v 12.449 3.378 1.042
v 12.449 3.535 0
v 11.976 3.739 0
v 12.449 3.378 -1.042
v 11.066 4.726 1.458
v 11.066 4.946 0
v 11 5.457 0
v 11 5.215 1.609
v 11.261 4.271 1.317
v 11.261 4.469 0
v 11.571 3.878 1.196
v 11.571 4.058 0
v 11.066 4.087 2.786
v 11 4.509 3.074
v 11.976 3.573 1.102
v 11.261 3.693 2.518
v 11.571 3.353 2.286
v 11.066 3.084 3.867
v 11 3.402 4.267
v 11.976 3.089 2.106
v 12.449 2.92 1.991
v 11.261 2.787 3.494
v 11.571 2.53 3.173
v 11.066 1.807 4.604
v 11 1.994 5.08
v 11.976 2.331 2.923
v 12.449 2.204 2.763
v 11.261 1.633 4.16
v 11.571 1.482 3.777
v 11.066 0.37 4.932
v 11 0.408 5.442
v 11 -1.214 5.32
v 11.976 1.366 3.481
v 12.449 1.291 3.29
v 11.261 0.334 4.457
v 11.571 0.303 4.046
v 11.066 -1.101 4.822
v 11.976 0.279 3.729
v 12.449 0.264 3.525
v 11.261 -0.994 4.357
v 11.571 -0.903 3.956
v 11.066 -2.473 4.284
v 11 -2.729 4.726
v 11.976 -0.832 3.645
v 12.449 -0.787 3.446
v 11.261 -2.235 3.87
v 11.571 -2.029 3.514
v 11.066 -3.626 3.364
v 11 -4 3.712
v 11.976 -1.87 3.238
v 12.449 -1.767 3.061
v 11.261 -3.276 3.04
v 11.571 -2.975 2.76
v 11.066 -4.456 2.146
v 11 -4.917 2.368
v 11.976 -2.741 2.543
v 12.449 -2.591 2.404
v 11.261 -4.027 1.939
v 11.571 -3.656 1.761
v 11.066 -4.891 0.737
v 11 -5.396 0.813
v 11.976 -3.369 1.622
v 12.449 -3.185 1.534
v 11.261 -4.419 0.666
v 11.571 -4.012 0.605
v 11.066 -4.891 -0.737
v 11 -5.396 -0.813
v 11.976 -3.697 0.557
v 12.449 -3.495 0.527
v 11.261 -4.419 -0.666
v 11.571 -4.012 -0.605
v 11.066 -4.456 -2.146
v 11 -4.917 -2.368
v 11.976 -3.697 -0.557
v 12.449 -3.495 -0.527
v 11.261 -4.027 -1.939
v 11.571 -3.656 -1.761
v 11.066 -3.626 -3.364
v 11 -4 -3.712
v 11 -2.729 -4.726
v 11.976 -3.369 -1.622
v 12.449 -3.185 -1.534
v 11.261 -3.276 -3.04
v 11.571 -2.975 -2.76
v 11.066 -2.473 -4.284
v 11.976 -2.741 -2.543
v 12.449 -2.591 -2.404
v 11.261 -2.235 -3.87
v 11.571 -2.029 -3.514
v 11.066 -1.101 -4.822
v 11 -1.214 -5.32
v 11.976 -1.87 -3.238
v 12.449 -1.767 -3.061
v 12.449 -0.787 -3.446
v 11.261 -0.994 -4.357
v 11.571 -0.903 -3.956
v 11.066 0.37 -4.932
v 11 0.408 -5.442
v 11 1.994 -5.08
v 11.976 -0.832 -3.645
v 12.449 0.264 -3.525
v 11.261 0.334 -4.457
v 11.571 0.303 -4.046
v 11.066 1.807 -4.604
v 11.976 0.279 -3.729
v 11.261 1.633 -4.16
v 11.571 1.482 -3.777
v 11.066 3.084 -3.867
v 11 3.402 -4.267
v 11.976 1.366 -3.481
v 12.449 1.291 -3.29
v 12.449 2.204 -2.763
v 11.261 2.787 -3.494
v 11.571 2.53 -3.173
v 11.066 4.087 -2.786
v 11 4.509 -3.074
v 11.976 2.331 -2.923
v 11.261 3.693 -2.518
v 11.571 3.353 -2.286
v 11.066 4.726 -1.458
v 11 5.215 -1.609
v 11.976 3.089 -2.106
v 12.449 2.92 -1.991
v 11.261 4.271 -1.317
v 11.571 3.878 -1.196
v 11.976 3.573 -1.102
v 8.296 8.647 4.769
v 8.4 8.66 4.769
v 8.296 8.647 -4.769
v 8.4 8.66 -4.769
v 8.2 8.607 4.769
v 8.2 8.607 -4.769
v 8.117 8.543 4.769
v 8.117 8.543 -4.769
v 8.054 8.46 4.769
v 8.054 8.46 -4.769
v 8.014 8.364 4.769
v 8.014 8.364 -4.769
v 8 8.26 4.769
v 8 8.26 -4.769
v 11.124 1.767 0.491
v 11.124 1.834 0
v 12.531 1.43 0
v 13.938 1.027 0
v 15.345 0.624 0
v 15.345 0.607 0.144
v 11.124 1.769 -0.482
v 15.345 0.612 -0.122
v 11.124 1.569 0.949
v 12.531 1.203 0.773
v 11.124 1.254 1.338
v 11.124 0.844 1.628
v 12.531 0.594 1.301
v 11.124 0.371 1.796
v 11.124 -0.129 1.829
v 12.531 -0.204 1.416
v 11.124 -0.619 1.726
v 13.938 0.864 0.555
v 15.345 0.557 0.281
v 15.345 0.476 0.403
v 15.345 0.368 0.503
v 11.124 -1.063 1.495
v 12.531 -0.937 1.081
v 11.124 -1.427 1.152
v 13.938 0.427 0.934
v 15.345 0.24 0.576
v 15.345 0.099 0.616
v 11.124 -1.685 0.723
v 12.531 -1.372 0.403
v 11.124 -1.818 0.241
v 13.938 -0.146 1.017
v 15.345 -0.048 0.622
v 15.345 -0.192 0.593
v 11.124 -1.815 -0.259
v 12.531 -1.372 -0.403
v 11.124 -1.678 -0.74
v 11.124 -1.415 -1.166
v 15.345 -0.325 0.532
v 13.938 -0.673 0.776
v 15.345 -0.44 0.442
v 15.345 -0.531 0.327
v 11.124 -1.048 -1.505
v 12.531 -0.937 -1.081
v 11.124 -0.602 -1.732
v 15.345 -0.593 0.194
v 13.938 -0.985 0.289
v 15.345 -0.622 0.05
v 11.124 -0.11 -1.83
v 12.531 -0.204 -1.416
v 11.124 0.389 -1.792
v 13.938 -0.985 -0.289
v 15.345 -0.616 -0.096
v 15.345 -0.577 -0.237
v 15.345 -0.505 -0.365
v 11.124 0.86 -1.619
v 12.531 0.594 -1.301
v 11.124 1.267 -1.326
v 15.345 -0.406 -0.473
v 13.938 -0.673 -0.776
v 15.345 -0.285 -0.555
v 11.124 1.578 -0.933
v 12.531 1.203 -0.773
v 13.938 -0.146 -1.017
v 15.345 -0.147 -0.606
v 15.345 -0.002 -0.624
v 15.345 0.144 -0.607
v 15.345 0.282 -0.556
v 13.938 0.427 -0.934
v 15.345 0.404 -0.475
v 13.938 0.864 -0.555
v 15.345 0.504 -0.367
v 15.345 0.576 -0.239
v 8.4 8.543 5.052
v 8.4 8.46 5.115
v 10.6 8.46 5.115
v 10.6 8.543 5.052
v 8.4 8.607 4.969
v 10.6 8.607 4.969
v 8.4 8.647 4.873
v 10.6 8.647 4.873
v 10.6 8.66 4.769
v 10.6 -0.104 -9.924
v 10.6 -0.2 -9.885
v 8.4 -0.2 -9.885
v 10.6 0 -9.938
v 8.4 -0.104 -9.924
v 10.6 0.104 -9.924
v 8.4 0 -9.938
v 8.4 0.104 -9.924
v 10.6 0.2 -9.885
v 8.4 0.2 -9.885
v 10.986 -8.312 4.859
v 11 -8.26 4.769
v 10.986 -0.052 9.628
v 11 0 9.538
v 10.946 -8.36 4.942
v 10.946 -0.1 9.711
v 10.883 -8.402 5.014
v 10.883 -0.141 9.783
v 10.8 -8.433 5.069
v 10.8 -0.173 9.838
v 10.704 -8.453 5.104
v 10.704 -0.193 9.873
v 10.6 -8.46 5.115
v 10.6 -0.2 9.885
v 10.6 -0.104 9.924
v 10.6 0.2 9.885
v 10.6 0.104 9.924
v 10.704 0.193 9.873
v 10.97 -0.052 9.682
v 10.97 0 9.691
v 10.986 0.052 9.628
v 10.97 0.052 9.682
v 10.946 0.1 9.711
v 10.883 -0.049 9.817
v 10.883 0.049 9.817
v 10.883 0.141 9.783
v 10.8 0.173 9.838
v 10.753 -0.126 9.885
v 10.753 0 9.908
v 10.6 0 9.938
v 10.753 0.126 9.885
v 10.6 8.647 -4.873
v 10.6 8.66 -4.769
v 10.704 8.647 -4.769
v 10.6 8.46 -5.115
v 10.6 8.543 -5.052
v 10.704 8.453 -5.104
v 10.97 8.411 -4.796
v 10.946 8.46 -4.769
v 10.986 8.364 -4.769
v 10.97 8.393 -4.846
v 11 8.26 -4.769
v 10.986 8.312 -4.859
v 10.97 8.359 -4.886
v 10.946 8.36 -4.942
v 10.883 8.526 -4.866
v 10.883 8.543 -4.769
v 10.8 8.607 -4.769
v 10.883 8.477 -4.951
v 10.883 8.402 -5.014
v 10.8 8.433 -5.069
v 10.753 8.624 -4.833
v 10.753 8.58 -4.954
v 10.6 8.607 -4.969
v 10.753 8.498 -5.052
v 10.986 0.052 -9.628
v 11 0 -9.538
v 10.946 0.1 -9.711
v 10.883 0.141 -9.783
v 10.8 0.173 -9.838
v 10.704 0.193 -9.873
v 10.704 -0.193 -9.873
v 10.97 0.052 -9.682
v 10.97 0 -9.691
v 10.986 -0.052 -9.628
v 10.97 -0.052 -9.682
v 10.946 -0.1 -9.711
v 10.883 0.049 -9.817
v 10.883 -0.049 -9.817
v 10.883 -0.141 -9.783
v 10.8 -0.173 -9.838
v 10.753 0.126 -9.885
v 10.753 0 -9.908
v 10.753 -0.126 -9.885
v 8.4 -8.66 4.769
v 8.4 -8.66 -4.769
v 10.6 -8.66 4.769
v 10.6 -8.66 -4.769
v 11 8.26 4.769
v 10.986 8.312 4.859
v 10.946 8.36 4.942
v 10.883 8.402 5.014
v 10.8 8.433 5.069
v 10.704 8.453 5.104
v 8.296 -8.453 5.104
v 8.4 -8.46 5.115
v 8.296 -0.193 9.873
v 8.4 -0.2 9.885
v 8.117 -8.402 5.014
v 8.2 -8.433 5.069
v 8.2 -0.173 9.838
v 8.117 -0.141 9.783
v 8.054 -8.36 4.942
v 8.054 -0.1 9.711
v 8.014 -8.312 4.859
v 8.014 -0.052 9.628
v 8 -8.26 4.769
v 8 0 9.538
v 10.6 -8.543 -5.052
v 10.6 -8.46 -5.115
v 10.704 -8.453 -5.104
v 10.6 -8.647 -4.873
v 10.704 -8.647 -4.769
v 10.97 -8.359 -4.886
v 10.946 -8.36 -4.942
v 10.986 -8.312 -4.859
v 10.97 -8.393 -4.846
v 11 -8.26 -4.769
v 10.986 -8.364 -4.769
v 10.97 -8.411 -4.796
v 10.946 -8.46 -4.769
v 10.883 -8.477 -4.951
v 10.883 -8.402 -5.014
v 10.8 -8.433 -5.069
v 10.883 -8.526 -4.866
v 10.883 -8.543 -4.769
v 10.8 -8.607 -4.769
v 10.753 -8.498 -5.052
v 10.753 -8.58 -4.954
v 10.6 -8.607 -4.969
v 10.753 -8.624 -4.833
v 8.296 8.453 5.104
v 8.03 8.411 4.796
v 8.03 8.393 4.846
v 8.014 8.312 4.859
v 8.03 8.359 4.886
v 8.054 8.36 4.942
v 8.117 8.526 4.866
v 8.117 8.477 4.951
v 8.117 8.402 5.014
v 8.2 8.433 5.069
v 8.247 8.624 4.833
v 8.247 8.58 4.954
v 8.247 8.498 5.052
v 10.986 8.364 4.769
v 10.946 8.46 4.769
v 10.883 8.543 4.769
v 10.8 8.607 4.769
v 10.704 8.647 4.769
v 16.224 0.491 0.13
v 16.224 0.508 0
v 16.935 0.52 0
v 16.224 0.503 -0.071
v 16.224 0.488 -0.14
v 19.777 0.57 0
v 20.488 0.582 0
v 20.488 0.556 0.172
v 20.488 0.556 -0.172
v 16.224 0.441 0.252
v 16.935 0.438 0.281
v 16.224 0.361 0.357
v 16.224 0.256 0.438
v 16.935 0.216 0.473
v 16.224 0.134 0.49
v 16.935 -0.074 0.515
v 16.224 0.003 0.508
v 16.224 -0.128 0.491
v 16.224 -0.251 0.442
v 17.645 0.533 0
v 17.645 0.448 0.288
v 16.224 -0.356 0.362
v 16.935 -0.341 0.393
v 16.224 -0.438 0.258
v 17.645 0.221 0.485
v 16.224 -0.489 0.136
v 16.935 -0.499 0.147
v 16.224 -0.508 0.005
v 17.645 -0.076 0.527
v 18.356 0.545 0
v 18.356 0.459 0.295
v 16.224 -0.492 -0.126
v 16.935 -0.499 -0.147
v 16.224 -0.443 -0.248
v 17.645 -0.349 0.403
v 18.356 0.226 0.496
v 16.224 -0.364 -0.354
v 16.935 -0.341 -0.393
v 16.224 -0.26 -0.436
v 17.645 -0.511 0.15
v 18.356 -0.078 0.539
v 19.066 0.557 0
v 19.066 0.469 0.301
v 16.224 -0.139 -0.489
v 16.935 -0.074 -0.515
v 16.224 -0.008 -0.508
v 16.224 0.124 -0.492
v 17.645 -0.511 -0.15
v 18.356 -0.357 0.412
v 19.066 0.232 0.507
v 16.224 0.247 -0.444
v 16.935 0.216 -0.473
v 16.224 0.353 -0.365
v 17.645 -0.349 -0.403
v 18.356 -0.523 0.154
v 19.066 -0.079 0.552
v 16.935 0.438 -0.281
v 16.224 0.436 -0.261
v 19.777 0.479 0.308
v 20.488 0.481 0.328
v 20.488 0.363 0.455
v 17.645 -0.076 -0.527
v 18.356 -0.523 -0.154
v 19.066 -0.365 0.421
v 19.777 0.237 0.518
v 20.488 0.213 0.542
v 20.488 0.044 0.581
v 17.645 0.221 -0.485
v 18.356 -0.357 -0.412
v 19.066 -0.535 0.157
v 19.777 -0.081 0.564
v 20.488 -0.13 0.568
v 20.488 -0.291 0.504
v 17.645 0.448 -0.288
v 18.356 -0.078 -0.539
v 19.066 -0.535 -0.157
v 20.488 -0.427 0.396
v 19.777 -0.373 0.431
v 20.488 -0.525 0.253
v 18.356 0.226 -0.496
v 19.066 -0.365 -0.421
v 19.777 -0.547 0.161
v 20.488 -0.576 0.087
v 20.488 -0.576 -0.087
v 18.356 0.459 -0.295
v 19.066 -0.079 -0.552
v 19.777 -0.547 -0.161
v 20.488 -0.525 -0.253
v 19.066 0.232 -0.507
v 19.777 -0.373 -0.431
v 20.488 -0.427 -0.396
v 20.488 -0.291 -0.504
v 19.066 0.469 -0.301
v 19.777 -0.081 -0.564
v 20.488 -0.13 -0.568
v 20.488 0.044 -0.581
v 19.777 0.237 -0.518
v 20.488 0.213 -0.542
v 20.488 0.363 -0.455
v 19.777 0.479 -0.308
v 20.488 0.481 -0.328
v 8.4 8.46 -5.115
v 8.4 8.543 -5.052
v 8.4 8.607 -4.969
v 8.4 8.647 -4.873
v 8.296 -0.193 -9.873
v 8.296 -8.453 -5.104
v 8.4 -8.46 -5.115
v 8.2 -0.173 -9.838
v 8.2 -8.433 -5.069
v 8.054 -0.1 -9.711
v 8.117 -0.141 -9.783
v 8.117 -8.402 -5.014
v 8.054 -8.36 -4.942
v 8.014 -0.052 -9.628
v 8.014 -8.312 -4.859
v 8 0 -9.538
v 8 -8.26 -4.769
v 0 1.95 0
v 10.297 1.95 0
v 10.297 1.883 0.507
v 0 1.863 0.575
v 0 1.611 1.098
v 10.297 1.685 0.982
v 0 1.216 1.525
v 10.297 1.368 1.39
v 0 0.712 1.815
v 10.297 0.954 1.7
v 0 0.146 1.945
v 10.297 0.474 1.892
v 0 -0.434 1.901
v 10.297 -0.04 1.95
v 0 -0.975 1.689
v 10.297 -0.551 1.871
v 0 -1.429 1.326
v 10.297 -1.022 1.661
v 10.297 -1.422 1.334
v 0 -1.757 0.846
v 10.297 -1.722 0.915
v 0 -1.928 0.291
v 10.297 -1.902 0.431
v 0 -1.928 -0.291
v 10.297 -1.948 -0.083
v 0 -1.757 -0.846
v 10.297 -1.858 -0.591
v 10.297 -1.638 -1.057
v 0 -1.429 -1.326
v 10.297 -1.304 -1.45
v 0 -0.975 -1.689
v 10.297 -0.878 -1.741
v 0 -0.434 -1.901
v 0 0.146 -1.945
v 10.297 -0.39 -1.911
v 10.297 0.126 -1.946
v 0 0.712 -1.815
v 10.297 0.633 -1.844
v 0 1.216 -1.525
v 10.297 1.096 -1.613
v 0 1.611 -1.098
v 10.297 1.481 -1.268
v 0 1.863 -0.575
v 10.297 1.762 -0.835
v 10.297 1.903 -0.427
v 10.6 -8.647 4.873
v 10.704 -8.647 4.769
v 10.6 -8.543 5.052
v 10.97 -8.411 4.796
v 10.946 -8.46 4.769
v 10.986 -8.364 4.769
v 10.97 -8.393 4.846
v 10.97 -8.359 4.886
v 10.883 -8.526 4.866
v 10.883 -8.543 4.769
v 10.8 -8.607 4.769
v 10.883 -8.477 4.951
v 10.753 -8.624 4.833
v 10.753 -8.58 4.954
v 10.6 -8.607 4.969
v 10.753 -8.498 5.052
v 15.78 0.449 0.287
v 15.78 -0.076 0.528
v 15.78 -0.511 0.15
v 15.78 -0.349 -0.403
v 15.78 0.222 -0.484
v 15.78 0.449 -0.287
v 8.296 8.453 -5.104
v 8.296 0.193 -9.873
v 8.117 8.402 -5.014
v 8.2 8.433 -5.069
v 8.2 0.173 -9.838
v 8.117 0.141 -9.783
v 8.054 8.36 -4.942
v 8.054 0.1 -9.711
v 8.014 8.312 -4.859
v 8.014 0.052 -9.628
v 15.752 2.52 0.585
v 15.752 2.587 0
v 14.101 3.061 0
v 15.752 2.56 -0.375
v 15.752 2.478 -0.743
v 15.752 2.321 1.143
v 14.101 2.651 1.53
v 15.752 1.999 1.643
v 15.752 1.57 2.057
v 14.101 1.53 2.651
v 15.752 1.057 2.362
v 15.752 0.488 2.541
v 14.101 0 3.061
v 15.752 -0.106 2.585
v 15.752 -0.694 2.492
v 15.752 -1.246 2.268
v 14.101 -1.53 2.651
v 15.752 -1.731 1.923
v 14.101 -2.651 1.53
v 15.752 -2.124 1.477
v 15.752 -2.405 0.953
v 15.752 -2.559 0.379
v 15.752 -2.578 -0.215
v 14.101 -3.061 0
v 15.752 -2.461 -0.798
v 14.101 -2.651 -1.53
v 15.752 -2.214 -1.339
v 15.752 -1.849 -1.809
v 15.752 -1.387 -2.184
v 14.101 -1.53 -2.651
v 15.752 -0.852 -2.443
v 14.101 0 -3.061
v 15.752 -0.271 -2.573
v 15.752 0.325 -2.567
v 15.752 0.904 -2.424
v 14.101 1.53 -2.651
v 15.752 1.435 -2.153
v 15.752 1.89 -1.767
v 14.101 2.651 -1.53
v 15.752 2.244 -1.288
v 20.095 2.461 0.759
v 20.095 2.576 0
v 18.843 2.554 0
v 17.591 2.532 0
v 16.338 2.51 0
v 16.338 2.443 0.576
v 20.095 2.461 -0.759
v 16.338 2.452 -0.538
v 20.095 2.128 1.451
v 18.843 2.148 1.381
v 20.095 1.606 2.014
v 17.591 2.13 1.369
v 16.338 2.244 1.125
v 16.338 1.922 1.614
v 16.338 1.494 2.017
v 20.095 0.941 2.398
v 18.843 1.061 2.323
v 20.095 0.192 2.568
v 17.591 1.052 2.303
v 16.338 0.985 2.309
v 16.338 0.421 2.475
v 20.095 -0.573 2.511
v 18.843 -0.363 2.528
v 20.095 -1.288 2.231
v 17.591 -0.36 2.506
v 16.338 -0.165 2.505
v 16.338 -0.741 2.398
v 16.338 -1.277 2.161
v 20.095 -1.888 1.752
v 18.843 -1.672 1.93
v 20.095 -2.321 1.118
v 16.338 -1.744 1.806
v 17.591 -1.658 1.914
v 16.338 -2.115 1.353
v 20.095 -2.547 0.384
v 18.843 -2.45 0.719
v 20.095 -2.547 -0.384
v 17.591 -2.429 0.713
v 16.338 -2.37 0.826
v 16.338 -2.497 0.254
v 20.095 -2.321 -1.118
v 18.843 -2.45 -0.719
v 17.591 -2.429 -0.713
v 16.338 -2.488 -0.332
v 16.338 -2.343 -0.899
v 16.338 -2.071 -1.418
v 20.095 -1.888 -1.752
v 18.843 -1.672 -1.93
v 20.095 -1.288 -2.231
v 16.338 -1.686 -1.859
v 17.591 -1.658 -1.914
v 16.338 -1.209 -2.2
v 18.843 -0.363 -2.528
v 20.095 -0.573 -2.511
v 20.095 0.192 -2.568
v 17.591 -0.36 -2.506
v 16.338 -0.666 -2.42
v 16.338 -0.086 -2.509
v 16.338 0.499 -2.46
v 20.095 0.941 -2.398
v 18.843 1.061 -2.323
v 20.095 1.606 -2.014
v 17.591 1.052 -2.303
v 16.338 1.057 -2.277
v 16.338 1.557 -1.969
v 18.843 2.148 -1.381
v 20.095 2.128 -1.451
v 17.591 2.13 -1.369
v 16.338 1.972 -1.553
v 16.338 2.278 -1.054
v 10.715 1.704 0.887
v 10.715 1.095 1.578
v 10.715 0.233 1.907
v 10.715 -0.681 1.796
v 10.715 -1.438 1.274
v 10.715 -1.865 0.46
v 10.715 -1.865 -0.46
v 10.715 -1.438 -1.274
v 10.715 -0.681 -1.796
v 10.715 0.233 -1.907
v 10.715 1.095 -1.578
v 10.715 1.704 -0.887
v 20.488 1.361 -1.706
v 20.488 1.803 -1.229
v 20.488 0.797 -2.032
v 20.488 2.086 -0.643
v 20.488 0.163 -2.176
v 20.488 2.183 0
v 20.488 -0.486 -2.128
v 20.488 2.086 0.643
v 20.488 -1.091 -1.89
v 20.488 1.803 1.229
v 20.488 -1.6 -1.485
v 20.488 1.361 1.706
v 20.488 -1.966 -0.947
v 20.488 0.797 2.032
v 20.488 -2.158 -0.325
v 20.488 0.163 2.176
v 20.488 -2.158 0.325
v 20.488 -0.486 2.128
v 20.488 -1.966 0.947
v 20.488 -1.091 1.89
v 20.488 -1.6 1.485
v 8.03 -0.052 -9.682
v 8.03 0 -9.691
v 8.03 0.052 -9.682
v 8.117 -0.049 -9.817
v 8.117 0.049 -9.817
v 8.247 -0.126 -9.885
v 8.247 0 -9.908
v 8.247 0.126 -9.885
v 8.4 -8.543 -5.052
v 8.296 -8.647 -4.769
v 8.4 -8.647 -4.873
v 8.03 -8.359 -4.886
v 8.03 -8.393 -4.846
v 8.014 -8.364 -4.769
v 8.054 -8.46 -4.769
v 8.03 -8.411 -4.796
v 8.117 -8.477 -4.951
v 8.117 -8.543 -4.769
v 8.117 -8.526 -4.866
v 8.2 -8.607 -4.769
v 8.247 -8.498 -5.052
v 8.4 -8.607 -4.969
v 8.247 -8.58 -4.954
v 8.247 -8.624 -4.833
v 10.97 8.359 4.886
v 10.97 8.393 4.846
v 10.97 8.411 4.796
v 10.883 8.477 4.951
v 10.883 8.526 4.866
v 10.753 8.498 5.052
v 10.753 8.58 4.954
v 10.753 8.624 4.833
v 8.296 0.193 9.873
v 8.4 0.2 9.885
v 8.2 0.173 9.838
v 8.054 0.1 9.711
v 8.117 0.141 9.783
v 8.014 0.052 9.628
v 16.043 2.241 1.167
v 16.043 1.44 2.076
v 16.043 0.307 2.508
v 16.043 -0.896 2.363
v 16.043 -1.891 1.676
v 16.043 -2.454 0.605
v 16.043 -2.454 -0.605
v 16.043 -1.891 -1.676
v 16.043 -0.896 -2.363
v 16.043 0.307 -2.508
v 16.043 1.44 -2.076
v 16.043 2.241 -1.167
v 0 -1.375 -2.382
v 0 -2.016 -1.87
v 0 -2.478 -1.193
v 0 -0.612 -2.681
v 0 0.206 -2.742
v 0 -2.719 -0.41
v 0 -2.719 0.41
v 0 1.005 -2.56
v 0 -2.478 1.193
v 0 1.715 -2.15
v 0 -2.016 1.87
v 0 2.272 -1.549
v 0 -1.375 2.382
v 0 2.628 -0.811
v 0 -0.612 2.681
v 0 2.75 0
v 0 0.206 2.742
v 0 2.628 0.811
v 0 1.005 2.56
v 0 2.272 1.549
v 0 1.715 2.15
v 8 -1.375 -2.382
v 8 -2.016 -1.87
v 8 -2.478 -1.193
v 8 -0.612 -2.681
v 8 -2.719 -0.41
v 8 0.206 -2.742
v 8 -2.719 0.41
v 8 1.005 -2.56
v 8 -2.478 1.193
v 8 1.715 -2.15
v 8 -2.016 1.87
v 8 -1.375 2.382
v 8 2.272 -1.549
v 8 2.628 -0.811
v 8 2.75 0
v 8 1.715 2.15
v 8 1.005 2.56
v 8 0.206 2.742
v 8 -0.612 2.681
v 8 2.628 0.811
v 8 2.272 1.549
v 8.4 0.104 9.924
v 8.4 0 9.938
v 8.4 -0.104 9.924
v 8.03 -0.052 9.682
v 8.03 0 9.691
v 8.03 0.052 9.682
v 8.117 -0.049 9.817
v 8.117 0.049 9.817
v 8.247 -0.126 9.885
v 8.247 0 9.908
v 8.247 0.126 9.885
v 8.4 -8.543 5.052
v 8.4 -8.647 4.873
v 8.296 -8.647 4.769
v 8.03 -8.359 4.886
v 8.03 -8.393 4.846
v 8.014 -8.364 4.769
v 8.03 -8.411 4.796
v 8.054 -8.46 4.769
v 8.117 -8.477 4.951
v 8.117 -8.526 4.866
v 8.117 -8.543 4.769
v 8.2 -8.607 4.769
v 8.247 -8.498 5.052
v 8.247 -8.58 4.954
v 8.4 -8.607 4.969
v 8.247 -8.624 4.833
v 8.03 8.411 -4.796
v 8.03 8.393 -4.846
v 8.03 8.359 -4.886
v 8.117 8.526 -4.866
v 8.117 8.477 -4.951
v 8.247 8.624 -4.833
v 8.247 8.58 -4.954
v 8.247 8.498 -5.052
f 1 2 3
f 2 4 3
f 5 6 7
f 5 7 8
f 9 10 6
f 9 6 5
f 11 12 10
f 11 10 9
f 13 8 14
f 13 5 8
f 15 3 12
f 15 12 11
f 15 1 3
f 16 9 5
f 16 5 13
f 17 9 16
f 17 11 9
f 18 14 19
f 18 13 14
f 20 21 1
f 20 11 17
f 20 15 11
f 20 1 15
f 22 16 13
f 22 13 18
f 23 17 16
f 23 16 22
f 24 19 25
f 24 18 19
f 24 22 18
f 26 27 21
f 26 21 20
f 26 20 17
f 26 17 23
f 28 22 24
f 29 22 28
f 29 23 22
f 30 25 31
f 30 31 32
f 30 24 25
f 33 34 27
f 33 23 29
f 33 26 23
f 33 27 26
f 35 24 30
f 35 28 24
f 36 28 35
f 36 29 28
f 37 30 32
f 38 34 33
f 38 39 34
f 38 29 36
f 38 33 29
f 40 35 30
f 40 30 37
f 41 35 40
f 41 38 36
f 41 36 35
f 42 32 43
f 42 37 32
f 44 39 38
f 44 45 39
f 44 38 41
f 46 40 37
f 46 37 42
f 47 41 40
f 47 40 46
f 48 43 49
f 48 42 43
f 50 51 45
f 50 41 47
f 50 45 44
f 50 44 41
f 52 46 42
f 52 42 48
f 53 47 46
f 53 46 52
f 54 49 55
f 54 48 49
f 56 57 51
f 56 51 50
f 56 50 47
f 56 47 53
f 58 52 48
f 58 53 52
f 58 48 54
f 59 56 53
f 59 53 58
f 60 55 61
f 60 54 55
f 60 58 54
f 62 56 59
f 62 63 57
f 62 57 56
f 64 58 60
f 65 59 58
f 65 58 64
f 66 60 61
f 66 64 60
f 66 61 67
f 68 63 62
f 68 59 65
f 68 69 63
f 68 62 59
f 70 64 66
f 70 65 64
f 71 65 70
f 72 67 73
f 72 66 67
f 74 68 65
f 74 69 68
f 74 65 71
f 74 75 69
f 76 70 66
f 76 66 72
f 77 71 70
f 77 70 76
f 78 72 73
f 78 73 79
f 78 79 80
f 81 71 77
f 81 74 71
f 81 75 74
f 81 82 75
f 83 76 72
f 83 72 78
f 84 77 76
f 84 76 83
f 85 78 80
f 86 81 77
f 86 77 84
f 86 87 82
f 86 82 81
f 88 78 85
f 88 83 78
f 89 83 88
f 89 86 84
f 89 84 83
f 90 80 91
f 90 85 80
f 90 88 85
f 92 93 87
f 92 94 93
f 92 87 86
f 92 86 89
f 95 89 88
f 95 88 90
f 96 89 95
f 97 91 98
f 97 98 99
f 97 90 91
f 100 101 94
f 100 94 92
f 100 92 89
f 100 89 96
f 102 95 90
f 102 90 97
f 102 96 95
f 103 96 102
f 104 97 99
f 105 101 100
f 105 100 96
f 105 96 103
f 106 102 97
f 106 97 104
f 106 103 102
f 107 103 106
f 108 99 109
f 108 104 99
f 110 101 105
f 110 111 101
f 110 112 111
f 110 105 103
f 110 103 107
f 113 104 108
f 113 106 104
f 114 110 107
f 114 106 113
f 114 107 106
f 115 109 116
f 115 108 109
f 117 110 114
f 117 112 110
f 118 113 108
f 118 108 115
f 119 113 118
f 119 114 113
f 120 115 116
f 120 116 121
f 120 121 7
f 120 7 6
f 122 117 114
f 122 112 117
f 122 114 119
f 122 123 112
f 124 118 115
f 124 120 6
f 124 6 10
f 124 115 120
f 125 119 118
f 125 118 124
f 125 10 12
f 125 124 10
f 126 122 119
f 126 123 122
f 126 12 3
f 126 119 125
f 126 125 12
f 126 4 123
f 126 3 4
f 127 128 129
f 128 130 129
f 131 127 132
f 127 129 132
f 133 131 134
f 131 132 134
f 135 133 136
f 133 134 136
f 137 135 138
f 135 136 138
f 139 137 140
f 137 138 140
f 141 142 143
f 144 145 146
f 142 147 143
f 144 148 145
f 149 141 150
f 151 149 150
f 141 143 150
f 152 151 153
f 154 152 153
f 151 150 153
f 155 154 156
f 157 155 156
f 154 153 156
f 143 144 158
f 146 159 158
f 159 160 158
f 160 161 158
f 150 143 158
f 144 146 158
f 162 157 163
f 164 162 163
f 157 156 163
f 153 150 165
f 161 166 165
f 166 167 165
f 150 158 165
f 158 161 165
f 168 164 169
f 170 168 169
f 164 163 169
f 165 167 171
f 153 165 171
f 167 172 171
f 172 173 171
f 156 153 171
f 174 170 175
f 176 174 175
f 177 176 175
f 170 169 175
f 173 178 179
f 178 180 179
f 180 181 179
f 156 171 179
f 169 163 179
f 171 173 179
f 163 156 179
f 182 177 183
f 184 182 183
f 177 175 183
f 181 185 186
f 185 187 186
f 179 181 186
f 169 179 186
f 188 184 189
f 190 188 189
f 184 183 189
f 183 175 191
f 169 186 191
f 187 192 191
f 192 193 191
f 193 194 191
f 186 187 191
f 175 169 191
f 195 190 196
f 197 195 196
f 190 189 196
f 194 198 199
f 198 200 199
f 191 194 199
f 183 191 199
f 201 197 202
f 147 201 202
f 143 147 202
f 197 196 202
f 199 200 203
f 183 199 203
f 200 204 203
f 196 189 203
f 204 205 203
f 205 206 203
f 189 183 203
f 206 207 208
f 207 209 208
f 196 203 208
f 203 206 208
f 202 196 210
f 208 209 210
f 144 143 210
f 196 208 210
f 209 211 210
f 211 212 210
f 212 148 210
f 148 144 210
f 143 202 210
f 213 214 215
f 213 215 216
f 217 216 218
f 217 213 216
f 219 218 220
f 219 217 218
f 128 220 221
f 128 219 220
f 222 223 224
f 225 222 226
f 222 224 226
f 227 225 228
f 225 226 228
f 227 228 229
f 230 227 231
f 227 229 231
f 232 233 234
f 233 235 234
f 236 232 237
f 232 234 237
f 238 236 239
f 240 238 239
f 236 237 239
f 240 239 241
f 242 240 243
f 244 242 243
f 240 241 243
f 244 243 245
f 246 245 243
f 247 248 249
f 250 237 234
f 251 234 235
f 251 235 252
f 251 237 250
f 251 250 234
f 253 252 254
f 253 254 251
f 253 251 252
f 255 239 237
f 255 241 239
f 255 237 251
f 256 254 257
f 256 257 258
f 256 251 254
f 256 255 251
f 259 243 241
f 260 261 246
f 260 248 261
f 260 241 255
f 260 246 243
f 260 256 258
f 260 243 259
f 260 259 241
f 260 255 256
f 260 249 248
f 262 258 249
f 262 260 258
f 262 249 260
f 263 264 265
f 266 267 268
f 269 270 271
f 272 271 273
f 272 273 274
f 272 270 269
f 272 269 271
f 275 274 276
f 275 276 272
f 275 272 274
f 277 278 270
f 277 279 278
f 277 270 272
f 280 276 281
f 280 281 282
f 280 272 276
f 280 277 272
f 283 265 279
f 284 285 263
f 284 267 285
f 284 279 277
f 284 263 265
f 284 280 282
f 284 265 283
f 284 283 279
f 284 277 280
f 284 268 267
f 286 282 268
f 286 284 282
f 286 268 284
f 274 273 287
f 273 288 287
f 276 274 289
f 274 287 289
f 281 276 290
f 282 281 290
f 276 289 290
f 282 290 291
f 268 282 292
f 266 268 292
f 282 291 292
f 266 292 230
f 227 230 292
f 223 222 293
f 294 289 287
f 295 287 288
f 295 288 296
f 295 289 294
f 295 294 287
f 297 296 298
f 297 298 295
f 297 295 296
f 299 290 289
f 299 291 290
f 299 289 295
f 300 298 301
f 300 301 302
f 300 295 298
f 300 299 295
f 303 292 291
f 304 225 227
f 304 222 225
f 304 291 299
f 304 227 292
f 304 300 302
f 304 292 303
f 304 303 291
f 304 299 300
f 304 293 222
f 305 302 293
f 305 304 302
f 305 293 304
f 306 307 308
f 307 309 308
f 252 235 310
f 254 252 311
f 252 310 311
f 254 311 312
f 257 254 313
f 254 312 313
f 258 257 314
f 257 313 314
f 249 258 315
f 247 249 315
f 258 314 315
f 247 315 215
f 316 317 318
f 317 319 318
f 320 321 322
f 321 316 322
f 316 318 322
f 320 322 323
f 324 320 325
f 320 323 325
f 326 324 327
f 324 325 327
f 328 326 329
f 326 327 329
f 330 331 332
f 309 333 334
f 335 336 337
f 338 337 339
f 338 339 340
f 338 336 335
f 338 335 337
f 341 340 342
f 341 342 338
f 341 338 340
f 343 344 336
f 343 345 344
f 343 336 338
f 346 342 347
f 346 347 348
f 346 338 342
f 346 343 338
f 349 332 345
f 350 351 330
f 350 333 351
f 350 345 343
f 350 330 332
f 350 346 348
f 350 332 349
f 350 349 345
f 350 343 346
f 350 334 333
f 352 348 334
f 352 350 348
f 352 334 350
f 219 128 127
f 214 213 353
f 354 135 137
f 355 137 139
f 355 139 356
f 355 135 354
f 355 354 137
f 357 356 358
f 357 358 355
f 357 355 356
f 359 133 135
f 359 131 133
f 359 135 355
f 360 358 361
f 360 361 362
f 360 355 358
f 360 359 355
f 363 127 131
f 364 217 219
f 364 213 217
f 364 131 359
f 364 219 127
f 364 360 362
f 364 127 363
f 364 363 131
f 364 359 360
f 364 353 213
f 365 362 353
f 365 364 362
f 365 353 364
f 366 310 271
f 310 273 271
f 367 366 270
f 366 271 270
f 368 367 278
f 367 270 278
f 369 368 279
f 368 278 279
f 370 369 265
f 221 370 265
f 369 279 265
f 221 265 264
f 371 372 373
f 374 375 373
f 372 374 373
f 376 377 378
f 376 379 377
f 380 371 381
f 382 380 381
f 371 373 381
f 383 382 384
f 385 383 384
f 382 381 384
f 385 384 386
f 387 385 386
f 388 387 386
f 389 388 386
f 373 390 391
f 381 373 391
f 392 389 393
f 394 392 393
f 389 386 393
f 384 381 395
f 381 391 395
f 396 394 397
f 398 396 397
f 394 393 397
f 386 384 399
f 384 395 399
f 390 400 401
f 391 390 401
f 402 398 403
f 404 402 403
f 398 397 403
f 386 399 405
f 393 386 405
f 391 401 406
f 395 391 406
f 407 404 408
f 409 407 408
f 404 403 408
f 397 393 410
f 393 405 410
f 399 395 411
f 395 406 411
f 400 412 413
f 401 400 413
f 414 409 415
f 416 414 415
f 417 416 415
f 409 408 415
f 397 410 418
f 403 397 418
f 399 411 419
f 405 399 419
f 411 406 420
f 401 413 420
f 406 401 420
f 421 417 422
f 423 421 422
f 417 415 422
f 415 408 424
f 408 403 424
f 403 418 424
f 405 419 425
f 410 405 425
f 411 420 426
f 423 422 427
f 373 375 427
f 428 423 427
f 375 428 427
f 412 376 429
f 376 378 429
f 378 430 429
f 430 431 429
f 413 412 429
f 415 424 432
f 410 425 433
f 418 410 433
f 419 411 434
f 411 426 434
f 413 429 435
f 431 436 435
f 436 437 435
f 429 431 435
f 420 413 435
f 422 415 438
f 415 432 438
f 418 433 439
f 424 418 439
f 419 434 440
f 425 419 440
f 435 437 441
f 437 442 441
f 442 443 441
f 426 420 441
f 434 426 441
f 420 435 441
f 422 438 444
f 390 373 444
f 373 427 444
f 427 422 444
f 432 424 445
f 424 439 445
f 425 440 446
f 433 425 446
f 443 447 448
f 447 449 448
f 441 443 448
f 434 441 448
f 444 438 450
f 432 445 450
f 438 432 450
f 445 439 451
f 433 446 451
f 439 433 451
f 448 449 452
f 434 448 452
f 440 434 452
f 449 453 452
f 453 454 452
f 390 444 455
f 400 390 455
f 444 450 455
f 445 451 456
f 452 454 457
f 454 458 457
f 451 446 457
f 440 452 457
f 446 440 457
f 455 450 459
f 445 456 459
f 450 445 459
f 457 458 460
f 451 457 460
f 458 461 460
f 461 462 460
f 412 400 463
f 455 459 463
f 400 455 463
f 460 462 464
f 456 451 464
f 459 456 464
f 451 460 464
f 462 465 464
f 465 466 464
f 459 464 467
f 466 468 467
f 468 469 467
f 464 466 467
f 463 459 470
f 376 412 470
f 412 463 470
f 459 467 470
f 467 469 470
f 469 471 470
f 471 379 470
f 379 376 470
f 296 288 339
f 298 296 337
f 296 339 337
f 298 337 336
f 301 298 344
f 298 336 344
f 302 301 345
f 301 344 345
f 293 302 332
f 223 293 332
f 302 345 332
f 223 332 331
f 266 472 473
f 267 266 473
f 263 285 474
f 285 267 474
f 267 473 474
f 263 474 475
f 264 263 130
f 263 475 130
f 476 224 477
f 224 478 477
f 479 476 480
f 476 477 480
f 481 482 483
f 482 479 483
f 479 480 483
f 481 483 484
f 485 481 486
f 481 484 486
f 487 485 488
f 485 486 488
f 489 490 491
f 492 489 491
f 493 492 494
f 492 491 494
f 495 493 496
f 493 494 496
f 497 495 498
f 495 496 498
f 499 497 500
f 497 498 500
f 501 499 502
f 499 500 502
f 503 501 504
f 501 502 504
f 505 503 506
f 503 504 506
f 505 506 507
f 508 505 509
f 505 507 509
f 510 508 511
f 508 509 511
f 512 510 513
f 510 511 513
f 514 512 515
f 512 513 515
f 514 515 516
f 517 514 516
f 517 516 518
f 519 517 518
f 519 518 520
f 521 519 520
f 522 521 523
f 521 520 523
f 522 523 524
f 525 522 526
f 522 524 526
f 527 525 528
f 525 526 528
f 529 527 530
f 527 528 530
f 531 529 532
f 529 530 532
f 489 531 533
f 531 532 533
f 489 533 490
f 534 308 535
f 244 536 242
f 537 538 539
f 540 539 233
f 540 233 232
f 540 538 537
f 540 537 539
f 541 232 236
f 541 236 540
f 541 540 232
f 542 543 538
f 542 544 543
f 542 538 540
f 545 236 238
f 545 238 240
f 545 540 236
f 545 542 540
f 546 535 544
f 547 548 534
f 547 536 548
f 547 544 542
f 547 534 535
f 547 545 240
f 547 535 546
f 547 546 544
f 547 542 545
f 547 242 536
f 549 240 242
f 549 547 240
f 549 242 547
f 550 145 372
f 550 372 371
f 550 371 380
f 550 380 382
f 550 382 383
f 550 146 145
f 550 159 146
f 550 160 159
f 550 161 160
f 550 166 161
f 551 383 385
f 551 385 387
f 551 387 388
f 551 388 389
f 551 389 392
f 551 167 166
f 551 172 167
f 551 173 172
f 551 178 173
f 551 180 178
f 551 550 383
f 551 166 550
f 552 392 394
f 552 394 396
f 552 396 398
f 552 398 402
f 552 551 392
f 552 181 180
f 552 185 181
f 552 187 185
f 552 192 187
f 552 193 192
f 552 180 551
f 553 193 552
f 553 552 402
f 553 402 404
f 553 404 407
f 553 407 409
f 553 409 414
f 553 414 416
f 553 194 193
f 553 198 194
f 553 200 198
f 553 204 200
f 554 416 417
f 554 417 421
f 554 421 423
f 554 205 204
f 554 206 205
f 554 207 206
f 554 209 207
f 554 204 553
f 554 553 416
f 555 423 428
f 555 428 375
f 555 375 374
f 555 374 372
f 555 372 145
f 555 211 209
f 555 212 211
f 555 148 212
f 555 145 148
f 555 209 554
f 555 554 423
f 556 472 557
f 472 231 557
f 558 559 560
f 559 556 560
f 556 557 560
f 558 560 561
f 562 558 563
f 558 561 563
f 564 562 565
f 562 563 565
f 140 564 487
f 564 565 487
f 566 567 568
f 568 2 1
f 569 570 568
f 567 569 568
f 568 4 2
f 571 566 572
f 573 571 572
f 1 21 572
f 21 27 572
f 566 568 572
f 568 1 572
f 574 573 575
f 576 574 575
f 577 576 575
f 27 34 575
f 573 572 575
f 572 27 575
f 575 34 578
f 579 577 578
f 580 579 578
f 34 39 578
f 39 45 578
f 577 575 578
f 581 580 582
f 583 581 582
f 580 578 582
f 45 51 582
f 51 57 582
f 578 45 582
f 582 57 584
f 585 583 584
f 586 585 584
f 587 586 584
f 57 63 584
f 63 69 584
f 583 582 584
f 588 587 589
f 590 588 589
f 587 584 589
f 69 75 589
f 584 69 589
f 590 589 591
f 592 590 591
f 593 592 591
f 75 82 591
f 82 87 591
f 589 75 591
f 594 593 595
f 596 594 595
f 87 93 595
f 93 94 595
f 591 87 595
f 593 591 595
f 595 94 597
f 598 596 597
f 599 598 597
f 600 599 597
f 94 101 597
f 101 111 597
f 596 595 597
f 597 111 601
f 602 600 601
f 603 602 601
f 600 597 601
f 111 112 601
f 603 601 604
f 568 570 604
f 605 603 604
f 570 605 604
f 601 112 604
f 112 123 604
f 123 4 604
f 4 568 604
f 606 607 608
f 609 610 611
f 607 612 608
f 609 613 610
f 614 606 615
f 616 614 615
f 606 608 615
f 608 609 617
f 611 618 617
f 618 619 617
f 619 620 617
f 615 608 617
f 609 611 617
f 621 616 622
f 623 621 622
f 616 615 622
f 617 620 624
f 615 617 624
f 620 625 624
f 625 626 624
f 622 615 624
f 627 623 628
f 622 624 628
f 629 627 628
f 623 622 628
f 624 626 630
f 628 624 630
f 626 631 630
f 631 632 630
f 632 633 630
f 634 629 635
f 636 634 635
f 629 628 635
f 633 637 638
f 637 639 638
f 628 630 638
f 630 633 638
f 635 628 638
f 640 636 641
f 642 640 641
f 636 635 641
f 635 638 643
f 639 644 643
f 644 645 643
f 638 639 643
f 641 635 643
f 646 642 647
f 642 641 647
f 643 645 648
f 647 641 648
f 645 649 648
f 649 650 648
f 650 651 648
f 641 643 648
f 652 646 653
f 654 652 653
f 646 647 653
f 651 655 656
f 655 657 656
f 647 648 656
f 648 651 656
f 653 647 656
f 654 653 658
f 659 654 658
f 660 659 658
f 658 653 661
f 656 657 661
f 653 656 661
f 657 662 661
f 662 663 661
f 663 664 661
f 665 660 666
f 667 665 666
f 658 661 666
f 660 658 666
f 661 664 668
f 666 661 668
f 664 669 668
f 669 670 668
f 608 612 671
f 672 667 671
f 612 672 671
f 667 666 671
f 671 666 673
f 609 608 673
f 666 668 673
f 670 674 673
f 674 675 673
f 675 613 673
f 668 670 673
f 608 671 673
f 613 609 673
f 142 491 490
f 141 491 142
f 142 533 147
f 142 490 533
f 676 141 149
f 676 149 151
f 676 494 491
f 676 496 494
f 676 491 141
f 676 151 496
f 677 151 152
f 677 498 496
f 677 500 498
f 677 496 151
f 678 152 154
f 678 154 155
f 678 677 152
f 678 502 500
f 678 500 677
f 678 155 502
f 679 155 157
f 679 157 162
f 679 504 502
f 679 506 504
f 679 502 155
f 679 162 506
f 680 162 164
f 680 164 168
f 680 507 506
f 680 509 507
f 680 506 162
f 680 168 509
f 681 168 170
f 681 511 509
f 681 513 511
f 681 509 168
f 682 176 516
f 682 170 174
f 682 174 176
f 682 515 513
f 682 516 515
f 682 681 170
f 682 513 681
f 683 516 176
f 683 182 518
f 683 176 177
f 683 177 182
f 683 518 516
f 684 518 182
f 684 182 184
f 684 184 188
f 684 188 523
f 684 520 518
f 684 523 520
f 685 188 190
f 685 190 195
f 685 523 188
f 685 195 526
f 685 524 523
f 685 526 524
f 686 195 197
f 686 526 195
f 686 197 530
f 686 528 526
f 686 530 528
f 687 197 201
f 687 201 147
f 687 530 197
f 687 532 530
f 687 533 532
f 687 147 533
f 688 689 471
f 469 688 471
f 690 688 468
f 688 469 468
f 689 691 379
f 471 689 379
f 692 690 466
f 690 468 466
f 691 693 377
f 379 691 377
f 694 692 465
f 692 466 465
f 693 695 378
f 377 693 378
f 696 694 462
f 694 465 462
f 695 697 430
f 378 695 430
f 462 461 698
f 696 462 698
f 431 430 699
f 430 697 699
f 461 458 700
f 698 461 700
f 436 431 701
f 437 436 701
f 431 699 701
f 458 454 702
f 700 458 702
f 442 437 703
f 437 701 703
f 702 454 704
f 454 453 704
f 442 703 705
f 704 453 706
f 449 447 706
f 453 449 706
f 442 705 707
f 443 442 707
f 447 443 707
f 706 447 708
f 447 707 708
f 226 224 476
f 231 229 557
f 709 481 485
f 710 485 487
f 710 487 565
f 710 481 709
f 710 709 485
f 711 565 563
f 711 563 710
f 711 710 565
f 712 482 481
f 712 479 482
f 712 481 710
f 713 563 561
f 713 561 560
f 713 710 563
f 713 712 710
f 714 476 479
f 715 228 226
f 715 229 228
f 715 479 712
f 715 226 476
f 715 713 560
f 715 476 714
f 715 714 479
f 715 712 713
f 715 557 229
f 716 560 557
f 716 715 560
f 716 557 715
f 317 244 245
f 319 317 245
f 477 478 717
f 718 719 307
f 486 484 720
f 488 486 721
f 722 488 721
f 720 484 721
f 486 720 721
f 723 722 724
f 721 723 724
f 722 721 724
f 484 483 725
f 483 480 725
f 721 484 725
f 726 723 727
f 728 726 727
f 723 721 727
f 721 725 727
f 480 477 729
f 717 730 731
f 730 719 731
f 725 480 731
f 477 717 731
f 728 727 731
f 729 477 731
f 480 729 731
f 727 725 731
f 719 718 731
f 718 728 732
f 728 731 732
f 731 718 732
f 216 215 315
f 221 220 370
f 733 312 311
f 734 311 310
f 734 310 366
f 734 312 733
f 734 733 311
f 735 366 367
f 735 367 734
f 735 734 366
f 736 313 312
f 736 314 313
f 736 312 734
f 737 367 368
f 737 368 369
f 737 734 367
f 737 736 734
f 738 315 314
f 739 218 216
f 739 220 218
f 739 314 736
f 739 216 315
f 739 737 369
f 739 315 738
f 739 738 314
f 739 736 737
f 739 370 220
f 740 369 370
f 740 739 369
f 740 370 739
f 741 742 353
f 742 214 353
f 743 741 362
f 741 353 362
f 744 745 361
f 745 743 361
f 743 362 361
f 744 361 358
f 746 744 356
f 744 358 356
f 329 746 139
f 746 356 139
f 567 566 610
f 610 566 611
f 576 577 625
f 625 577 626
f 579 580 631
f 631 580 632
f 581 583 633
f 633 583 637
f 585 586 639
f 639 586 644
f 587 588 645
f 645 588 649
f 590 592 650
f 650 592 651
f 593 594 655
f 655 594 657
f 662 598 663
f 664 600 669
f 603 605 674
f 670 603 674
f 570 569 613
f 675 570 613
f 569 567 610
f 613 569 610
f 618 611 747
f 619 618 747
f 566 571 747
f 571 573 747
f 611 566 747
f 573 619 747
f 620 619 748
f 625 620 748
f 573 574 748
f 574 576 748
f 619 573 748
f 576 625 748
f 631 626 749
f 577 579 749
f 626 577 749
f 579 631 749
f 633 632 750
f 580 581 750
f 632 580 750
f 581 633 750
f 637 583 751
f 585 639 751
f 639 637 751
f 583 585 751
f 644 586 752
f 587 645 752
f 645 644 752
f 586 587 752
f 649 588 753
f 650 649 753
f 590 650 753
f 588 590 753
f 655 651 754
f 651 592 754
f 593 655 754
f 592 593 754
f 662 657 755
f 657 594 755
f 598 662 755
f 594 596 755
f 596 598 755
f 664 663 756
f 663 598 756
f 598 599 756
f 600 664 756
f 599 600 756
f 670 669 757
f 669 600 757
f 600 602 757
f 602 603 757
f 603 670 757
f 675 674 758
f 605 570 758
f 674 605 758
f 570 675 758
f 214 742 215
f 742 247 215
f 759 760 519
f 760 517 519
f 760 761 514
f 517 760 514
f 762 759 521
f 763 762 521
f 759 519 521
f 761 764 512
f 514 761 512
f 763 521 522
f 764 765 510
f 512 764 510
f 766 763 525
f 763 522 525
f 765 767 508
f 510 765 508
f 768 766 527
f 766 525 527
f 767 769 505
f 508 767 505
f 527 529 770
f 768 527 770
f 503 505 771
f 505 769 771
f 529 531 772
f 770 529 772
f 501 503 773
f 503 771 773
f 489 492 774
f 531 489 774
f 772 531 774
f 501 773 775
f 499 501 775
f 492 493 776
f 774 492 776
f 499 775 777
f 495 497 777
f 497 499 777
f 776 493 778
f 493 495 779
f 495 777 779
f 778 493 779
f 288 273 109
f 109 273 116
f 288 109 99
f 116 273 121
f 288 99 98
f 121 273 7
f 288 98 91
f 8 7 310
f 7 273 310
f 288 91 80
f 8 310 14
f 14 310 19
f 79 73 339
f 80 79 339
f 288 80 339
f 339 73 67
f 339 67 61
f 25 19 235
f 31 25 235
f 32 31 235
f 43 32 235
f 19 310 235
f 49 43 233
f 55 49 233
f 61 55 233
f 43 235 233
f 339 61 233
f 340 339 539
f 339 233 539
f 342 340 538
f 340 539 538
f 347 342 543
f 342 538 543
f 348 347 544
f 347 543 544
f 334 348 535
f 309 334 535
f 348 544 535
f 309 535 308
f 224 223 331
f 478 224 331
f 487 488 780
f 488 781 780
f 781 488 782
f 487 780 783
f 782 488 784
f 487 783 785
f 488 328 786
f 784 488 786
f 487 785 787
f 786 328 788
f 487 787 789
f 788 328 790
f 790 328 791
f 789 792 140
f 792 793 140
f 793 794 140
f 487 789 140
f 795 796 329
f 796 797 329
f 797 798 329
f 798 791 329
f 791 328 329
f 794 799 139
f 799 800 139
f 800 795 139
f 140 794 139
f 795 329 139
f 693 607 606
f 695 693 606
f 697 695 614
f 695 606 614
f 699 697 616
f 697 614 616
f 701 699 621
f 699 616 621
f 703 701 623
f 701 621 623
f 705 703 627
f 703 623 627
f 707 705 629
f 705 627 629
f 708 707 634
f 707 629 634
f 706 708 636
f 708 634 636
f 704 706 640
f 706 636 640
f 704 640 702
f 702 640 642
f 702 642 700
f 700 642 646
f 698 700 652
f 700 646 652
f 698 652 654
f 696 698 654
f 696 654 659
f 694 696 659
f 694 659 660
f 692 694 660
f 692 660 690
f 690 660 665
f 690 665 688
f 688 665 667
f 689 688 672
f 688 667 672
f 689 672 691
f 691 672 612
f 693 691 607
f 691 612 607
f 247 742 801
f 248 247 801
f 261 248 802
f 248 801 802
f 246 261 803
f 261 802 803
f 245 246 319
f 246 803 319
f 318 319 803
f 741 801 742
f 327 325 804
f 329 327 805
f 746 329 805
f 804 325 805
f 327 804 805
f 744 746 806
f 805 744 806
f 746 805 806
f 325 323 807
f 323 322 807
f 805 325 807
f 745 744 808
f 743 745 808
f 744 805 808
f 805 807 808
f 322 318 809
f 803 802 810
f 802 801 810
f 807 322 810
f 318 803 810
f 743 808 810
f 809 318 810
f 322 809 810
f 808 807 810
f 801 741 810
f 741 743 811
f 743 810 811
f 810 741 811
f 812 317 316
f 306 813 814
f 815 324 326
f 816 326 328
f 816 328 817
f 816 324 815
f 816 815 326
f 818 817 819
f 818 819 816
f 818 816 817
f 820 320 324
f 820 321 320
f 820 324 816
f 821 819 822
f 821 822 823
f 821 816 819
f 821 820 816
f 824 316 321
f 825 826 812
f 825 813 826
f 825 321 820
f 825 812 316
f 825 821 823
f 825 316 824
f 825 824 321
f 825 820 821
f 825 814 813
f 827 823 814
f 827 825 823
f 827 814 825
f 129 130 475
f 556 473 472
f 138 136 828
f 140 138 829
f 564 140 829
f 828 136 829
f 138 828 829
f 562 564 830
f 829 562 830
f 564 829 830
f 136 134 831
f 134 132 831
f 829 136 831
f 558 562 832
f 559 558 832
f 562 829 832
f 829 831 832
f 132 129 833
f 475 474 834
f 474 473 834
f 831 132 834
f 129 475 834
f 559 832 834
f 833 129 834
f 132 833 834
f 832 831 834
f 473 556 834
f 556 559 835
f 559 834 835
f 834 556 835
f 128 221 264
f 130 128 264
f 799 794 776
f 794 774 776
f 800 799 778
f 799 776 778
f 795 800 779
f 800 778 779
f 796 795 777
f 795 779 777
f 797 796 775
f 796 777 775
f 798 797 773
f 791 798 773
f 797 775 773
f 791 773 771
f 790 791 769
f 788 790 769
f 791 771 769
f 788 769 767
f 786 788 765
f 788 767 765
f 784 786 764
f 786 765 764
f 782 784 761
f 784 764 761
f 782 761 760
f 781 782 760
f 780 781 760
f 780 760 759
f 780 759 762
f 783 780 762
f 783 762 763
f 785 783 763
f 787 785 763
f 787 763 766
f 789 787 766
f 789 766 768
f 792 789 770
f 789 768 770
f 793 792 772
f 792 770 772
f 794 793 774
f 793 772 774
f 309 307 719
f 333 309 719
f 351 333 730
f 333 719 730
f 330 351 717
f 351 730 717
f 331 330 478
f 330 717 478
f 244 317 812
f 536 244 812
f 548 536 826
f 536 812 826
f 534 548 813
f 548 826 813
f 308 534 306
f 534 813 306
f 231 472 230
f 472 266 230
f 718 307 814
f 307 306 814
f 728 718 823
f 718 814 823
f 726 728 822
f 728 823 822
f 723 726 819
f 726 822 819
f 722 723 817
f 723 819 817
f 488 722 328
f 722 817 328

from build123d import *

# Parameters (mm, degrees)
FILLET4_R               = 3
CHAMFER1_SIZE2          = 0.393197641
CHAMFER1_SIZE           = 0.4
CUT_EXTRUDE1_DEPTH      = 10.487768718
CUT_EXTRUDE1_DEPTH_BACK = 12.0000001
FILLET5_R               = 0.4
FILLET6_R               = 2


with BuildPart() as part:
    # Sketch1 → Revolve1 (revolve)
    with BuildSketch(Plane.XY):
        Polygon((0, 1.95), (10.718918331, 1.95), (15.775669274, 0.5), (20.487768618, 0.58225), (20.487768618, 2.582554656), (16.03962094, 2.50491195), (11, 3.95), (11, 10), (8, 10), (8, 2.75), (0, 2.75), align=None)
    revolve(axis=Axis((0, 0, 0), (1, 0, 0)))

    # Fillet4
    fillet4_edges = [part.edges().sort_by_distance(p)[0] for p in [
        (15.775669274, -0.5, 0),
        (10.718918331, -1.95, 0),
    ]]
    fillet(fillet4_edges, radius=FILLET4_R)

    # Chamfer1
    chamfer1_edges = [part.edges().sort_by_distance(p)[0] for p in [
        (20.487768618, -2.582554656, 0),
    ]]
    chamfer(chamfer1_edges, length=CHAMFER1_SIZE, length2=CHAMFER1_SIZE2)

    # Sketch2 → Cut-Extrude1 (cut, two sides)
    with BuildSketch(Plane(origin=(11, 0, 0), x_dir=(0, 0, -1), z_dir=(1, 0, 0))) as cut_extrude1_sk:
        with BuildLine():
            Line((-10, 0), (-5, 8.660254038))
            ThreePointArc((-5, 8.660254038), (-8.660254038, 5), (-10, 0))
        make_face()
        with BuildLine():
            Line((-5, 8.660254038), (5, 8.660254038))
            ThreePointArc((5, 8.660254038), (0, 10), (-5, 8.660254038))
        make_face()
        with BuildLine():
            Line((5, 8.660254038), (10, 0))
            ThreePointArc((10, 0), (8.660254038, 5), (5, 8.660254038))
        make_face()
        with BuildLine():
            ThreePointArc((-10, 0), (-8.660254038, -5), (-5, -8.660254038))
            Line((-5, -8.660254038), (-10, 0))
        make_face()
        with BuildLine():
            ThreePointArc((-5, -8.660254038), (0, -10), (5, -8.660254038))
            Line((5, -8.660254038), (-5, -8.660254038))
        make_face()
        with BuildLine():
            ThreePointArc((5, -8.660254038), (8.660254038, -5), (10, 0))
            Line((10, 0), (5, -8.660254038))
        make_face()
    extrude(amount=CUT_EXTRUDE1_DEPTH, mode=Mode.SUBTRACT)
    extrude(cut_extrude1_sk.sketch, amount=-CUT_EXTRUDE1_DEPTH_BACK, mode=Mode.SUBTRACT)

    # Fillet5
    fillet5_edges = [part.edges().sort_by_distance(p)[0] for p in [
        (11, -4.330127019, -7.5),
        (8, -4.330127019, -7.5),
        (8, -8.660254038, 0),
        (8, 4.330127019, -7.5),
        (8, 4.330127019, 7.5),
        (9.5, 8.660254038, 5),
        (11, 4.330127019, 7.5),
        (9.5, 0, 10),
        (9.5, 0, -10),
        (11, 4.330127019, -7.5),
        (9.5, 8.660254038, -5),
        (9.5, -8.660254038, 5),
        (11, -8.660254038, 0),
        (9.5, -8.660254038, -5),
        (11, 8.660254038, 0),
        (8, 8.660254038, 0),
        (11, -4.330127019, 7.5),
        (8, -4.330127019, 7.5),
    ]]
    fillet(fillet5_edges, radius=FILLET5_R)

    # Fillet6
    fillet6_edges = [part.edges().sort_by_distance(p)[0] for p in [
        (11, -3.95, 0),
        (16.03962094, -2.50491195, 0),
    ]]
    fillet(fillet6_edges, radius=FILLET6_R)


solid = part.part
